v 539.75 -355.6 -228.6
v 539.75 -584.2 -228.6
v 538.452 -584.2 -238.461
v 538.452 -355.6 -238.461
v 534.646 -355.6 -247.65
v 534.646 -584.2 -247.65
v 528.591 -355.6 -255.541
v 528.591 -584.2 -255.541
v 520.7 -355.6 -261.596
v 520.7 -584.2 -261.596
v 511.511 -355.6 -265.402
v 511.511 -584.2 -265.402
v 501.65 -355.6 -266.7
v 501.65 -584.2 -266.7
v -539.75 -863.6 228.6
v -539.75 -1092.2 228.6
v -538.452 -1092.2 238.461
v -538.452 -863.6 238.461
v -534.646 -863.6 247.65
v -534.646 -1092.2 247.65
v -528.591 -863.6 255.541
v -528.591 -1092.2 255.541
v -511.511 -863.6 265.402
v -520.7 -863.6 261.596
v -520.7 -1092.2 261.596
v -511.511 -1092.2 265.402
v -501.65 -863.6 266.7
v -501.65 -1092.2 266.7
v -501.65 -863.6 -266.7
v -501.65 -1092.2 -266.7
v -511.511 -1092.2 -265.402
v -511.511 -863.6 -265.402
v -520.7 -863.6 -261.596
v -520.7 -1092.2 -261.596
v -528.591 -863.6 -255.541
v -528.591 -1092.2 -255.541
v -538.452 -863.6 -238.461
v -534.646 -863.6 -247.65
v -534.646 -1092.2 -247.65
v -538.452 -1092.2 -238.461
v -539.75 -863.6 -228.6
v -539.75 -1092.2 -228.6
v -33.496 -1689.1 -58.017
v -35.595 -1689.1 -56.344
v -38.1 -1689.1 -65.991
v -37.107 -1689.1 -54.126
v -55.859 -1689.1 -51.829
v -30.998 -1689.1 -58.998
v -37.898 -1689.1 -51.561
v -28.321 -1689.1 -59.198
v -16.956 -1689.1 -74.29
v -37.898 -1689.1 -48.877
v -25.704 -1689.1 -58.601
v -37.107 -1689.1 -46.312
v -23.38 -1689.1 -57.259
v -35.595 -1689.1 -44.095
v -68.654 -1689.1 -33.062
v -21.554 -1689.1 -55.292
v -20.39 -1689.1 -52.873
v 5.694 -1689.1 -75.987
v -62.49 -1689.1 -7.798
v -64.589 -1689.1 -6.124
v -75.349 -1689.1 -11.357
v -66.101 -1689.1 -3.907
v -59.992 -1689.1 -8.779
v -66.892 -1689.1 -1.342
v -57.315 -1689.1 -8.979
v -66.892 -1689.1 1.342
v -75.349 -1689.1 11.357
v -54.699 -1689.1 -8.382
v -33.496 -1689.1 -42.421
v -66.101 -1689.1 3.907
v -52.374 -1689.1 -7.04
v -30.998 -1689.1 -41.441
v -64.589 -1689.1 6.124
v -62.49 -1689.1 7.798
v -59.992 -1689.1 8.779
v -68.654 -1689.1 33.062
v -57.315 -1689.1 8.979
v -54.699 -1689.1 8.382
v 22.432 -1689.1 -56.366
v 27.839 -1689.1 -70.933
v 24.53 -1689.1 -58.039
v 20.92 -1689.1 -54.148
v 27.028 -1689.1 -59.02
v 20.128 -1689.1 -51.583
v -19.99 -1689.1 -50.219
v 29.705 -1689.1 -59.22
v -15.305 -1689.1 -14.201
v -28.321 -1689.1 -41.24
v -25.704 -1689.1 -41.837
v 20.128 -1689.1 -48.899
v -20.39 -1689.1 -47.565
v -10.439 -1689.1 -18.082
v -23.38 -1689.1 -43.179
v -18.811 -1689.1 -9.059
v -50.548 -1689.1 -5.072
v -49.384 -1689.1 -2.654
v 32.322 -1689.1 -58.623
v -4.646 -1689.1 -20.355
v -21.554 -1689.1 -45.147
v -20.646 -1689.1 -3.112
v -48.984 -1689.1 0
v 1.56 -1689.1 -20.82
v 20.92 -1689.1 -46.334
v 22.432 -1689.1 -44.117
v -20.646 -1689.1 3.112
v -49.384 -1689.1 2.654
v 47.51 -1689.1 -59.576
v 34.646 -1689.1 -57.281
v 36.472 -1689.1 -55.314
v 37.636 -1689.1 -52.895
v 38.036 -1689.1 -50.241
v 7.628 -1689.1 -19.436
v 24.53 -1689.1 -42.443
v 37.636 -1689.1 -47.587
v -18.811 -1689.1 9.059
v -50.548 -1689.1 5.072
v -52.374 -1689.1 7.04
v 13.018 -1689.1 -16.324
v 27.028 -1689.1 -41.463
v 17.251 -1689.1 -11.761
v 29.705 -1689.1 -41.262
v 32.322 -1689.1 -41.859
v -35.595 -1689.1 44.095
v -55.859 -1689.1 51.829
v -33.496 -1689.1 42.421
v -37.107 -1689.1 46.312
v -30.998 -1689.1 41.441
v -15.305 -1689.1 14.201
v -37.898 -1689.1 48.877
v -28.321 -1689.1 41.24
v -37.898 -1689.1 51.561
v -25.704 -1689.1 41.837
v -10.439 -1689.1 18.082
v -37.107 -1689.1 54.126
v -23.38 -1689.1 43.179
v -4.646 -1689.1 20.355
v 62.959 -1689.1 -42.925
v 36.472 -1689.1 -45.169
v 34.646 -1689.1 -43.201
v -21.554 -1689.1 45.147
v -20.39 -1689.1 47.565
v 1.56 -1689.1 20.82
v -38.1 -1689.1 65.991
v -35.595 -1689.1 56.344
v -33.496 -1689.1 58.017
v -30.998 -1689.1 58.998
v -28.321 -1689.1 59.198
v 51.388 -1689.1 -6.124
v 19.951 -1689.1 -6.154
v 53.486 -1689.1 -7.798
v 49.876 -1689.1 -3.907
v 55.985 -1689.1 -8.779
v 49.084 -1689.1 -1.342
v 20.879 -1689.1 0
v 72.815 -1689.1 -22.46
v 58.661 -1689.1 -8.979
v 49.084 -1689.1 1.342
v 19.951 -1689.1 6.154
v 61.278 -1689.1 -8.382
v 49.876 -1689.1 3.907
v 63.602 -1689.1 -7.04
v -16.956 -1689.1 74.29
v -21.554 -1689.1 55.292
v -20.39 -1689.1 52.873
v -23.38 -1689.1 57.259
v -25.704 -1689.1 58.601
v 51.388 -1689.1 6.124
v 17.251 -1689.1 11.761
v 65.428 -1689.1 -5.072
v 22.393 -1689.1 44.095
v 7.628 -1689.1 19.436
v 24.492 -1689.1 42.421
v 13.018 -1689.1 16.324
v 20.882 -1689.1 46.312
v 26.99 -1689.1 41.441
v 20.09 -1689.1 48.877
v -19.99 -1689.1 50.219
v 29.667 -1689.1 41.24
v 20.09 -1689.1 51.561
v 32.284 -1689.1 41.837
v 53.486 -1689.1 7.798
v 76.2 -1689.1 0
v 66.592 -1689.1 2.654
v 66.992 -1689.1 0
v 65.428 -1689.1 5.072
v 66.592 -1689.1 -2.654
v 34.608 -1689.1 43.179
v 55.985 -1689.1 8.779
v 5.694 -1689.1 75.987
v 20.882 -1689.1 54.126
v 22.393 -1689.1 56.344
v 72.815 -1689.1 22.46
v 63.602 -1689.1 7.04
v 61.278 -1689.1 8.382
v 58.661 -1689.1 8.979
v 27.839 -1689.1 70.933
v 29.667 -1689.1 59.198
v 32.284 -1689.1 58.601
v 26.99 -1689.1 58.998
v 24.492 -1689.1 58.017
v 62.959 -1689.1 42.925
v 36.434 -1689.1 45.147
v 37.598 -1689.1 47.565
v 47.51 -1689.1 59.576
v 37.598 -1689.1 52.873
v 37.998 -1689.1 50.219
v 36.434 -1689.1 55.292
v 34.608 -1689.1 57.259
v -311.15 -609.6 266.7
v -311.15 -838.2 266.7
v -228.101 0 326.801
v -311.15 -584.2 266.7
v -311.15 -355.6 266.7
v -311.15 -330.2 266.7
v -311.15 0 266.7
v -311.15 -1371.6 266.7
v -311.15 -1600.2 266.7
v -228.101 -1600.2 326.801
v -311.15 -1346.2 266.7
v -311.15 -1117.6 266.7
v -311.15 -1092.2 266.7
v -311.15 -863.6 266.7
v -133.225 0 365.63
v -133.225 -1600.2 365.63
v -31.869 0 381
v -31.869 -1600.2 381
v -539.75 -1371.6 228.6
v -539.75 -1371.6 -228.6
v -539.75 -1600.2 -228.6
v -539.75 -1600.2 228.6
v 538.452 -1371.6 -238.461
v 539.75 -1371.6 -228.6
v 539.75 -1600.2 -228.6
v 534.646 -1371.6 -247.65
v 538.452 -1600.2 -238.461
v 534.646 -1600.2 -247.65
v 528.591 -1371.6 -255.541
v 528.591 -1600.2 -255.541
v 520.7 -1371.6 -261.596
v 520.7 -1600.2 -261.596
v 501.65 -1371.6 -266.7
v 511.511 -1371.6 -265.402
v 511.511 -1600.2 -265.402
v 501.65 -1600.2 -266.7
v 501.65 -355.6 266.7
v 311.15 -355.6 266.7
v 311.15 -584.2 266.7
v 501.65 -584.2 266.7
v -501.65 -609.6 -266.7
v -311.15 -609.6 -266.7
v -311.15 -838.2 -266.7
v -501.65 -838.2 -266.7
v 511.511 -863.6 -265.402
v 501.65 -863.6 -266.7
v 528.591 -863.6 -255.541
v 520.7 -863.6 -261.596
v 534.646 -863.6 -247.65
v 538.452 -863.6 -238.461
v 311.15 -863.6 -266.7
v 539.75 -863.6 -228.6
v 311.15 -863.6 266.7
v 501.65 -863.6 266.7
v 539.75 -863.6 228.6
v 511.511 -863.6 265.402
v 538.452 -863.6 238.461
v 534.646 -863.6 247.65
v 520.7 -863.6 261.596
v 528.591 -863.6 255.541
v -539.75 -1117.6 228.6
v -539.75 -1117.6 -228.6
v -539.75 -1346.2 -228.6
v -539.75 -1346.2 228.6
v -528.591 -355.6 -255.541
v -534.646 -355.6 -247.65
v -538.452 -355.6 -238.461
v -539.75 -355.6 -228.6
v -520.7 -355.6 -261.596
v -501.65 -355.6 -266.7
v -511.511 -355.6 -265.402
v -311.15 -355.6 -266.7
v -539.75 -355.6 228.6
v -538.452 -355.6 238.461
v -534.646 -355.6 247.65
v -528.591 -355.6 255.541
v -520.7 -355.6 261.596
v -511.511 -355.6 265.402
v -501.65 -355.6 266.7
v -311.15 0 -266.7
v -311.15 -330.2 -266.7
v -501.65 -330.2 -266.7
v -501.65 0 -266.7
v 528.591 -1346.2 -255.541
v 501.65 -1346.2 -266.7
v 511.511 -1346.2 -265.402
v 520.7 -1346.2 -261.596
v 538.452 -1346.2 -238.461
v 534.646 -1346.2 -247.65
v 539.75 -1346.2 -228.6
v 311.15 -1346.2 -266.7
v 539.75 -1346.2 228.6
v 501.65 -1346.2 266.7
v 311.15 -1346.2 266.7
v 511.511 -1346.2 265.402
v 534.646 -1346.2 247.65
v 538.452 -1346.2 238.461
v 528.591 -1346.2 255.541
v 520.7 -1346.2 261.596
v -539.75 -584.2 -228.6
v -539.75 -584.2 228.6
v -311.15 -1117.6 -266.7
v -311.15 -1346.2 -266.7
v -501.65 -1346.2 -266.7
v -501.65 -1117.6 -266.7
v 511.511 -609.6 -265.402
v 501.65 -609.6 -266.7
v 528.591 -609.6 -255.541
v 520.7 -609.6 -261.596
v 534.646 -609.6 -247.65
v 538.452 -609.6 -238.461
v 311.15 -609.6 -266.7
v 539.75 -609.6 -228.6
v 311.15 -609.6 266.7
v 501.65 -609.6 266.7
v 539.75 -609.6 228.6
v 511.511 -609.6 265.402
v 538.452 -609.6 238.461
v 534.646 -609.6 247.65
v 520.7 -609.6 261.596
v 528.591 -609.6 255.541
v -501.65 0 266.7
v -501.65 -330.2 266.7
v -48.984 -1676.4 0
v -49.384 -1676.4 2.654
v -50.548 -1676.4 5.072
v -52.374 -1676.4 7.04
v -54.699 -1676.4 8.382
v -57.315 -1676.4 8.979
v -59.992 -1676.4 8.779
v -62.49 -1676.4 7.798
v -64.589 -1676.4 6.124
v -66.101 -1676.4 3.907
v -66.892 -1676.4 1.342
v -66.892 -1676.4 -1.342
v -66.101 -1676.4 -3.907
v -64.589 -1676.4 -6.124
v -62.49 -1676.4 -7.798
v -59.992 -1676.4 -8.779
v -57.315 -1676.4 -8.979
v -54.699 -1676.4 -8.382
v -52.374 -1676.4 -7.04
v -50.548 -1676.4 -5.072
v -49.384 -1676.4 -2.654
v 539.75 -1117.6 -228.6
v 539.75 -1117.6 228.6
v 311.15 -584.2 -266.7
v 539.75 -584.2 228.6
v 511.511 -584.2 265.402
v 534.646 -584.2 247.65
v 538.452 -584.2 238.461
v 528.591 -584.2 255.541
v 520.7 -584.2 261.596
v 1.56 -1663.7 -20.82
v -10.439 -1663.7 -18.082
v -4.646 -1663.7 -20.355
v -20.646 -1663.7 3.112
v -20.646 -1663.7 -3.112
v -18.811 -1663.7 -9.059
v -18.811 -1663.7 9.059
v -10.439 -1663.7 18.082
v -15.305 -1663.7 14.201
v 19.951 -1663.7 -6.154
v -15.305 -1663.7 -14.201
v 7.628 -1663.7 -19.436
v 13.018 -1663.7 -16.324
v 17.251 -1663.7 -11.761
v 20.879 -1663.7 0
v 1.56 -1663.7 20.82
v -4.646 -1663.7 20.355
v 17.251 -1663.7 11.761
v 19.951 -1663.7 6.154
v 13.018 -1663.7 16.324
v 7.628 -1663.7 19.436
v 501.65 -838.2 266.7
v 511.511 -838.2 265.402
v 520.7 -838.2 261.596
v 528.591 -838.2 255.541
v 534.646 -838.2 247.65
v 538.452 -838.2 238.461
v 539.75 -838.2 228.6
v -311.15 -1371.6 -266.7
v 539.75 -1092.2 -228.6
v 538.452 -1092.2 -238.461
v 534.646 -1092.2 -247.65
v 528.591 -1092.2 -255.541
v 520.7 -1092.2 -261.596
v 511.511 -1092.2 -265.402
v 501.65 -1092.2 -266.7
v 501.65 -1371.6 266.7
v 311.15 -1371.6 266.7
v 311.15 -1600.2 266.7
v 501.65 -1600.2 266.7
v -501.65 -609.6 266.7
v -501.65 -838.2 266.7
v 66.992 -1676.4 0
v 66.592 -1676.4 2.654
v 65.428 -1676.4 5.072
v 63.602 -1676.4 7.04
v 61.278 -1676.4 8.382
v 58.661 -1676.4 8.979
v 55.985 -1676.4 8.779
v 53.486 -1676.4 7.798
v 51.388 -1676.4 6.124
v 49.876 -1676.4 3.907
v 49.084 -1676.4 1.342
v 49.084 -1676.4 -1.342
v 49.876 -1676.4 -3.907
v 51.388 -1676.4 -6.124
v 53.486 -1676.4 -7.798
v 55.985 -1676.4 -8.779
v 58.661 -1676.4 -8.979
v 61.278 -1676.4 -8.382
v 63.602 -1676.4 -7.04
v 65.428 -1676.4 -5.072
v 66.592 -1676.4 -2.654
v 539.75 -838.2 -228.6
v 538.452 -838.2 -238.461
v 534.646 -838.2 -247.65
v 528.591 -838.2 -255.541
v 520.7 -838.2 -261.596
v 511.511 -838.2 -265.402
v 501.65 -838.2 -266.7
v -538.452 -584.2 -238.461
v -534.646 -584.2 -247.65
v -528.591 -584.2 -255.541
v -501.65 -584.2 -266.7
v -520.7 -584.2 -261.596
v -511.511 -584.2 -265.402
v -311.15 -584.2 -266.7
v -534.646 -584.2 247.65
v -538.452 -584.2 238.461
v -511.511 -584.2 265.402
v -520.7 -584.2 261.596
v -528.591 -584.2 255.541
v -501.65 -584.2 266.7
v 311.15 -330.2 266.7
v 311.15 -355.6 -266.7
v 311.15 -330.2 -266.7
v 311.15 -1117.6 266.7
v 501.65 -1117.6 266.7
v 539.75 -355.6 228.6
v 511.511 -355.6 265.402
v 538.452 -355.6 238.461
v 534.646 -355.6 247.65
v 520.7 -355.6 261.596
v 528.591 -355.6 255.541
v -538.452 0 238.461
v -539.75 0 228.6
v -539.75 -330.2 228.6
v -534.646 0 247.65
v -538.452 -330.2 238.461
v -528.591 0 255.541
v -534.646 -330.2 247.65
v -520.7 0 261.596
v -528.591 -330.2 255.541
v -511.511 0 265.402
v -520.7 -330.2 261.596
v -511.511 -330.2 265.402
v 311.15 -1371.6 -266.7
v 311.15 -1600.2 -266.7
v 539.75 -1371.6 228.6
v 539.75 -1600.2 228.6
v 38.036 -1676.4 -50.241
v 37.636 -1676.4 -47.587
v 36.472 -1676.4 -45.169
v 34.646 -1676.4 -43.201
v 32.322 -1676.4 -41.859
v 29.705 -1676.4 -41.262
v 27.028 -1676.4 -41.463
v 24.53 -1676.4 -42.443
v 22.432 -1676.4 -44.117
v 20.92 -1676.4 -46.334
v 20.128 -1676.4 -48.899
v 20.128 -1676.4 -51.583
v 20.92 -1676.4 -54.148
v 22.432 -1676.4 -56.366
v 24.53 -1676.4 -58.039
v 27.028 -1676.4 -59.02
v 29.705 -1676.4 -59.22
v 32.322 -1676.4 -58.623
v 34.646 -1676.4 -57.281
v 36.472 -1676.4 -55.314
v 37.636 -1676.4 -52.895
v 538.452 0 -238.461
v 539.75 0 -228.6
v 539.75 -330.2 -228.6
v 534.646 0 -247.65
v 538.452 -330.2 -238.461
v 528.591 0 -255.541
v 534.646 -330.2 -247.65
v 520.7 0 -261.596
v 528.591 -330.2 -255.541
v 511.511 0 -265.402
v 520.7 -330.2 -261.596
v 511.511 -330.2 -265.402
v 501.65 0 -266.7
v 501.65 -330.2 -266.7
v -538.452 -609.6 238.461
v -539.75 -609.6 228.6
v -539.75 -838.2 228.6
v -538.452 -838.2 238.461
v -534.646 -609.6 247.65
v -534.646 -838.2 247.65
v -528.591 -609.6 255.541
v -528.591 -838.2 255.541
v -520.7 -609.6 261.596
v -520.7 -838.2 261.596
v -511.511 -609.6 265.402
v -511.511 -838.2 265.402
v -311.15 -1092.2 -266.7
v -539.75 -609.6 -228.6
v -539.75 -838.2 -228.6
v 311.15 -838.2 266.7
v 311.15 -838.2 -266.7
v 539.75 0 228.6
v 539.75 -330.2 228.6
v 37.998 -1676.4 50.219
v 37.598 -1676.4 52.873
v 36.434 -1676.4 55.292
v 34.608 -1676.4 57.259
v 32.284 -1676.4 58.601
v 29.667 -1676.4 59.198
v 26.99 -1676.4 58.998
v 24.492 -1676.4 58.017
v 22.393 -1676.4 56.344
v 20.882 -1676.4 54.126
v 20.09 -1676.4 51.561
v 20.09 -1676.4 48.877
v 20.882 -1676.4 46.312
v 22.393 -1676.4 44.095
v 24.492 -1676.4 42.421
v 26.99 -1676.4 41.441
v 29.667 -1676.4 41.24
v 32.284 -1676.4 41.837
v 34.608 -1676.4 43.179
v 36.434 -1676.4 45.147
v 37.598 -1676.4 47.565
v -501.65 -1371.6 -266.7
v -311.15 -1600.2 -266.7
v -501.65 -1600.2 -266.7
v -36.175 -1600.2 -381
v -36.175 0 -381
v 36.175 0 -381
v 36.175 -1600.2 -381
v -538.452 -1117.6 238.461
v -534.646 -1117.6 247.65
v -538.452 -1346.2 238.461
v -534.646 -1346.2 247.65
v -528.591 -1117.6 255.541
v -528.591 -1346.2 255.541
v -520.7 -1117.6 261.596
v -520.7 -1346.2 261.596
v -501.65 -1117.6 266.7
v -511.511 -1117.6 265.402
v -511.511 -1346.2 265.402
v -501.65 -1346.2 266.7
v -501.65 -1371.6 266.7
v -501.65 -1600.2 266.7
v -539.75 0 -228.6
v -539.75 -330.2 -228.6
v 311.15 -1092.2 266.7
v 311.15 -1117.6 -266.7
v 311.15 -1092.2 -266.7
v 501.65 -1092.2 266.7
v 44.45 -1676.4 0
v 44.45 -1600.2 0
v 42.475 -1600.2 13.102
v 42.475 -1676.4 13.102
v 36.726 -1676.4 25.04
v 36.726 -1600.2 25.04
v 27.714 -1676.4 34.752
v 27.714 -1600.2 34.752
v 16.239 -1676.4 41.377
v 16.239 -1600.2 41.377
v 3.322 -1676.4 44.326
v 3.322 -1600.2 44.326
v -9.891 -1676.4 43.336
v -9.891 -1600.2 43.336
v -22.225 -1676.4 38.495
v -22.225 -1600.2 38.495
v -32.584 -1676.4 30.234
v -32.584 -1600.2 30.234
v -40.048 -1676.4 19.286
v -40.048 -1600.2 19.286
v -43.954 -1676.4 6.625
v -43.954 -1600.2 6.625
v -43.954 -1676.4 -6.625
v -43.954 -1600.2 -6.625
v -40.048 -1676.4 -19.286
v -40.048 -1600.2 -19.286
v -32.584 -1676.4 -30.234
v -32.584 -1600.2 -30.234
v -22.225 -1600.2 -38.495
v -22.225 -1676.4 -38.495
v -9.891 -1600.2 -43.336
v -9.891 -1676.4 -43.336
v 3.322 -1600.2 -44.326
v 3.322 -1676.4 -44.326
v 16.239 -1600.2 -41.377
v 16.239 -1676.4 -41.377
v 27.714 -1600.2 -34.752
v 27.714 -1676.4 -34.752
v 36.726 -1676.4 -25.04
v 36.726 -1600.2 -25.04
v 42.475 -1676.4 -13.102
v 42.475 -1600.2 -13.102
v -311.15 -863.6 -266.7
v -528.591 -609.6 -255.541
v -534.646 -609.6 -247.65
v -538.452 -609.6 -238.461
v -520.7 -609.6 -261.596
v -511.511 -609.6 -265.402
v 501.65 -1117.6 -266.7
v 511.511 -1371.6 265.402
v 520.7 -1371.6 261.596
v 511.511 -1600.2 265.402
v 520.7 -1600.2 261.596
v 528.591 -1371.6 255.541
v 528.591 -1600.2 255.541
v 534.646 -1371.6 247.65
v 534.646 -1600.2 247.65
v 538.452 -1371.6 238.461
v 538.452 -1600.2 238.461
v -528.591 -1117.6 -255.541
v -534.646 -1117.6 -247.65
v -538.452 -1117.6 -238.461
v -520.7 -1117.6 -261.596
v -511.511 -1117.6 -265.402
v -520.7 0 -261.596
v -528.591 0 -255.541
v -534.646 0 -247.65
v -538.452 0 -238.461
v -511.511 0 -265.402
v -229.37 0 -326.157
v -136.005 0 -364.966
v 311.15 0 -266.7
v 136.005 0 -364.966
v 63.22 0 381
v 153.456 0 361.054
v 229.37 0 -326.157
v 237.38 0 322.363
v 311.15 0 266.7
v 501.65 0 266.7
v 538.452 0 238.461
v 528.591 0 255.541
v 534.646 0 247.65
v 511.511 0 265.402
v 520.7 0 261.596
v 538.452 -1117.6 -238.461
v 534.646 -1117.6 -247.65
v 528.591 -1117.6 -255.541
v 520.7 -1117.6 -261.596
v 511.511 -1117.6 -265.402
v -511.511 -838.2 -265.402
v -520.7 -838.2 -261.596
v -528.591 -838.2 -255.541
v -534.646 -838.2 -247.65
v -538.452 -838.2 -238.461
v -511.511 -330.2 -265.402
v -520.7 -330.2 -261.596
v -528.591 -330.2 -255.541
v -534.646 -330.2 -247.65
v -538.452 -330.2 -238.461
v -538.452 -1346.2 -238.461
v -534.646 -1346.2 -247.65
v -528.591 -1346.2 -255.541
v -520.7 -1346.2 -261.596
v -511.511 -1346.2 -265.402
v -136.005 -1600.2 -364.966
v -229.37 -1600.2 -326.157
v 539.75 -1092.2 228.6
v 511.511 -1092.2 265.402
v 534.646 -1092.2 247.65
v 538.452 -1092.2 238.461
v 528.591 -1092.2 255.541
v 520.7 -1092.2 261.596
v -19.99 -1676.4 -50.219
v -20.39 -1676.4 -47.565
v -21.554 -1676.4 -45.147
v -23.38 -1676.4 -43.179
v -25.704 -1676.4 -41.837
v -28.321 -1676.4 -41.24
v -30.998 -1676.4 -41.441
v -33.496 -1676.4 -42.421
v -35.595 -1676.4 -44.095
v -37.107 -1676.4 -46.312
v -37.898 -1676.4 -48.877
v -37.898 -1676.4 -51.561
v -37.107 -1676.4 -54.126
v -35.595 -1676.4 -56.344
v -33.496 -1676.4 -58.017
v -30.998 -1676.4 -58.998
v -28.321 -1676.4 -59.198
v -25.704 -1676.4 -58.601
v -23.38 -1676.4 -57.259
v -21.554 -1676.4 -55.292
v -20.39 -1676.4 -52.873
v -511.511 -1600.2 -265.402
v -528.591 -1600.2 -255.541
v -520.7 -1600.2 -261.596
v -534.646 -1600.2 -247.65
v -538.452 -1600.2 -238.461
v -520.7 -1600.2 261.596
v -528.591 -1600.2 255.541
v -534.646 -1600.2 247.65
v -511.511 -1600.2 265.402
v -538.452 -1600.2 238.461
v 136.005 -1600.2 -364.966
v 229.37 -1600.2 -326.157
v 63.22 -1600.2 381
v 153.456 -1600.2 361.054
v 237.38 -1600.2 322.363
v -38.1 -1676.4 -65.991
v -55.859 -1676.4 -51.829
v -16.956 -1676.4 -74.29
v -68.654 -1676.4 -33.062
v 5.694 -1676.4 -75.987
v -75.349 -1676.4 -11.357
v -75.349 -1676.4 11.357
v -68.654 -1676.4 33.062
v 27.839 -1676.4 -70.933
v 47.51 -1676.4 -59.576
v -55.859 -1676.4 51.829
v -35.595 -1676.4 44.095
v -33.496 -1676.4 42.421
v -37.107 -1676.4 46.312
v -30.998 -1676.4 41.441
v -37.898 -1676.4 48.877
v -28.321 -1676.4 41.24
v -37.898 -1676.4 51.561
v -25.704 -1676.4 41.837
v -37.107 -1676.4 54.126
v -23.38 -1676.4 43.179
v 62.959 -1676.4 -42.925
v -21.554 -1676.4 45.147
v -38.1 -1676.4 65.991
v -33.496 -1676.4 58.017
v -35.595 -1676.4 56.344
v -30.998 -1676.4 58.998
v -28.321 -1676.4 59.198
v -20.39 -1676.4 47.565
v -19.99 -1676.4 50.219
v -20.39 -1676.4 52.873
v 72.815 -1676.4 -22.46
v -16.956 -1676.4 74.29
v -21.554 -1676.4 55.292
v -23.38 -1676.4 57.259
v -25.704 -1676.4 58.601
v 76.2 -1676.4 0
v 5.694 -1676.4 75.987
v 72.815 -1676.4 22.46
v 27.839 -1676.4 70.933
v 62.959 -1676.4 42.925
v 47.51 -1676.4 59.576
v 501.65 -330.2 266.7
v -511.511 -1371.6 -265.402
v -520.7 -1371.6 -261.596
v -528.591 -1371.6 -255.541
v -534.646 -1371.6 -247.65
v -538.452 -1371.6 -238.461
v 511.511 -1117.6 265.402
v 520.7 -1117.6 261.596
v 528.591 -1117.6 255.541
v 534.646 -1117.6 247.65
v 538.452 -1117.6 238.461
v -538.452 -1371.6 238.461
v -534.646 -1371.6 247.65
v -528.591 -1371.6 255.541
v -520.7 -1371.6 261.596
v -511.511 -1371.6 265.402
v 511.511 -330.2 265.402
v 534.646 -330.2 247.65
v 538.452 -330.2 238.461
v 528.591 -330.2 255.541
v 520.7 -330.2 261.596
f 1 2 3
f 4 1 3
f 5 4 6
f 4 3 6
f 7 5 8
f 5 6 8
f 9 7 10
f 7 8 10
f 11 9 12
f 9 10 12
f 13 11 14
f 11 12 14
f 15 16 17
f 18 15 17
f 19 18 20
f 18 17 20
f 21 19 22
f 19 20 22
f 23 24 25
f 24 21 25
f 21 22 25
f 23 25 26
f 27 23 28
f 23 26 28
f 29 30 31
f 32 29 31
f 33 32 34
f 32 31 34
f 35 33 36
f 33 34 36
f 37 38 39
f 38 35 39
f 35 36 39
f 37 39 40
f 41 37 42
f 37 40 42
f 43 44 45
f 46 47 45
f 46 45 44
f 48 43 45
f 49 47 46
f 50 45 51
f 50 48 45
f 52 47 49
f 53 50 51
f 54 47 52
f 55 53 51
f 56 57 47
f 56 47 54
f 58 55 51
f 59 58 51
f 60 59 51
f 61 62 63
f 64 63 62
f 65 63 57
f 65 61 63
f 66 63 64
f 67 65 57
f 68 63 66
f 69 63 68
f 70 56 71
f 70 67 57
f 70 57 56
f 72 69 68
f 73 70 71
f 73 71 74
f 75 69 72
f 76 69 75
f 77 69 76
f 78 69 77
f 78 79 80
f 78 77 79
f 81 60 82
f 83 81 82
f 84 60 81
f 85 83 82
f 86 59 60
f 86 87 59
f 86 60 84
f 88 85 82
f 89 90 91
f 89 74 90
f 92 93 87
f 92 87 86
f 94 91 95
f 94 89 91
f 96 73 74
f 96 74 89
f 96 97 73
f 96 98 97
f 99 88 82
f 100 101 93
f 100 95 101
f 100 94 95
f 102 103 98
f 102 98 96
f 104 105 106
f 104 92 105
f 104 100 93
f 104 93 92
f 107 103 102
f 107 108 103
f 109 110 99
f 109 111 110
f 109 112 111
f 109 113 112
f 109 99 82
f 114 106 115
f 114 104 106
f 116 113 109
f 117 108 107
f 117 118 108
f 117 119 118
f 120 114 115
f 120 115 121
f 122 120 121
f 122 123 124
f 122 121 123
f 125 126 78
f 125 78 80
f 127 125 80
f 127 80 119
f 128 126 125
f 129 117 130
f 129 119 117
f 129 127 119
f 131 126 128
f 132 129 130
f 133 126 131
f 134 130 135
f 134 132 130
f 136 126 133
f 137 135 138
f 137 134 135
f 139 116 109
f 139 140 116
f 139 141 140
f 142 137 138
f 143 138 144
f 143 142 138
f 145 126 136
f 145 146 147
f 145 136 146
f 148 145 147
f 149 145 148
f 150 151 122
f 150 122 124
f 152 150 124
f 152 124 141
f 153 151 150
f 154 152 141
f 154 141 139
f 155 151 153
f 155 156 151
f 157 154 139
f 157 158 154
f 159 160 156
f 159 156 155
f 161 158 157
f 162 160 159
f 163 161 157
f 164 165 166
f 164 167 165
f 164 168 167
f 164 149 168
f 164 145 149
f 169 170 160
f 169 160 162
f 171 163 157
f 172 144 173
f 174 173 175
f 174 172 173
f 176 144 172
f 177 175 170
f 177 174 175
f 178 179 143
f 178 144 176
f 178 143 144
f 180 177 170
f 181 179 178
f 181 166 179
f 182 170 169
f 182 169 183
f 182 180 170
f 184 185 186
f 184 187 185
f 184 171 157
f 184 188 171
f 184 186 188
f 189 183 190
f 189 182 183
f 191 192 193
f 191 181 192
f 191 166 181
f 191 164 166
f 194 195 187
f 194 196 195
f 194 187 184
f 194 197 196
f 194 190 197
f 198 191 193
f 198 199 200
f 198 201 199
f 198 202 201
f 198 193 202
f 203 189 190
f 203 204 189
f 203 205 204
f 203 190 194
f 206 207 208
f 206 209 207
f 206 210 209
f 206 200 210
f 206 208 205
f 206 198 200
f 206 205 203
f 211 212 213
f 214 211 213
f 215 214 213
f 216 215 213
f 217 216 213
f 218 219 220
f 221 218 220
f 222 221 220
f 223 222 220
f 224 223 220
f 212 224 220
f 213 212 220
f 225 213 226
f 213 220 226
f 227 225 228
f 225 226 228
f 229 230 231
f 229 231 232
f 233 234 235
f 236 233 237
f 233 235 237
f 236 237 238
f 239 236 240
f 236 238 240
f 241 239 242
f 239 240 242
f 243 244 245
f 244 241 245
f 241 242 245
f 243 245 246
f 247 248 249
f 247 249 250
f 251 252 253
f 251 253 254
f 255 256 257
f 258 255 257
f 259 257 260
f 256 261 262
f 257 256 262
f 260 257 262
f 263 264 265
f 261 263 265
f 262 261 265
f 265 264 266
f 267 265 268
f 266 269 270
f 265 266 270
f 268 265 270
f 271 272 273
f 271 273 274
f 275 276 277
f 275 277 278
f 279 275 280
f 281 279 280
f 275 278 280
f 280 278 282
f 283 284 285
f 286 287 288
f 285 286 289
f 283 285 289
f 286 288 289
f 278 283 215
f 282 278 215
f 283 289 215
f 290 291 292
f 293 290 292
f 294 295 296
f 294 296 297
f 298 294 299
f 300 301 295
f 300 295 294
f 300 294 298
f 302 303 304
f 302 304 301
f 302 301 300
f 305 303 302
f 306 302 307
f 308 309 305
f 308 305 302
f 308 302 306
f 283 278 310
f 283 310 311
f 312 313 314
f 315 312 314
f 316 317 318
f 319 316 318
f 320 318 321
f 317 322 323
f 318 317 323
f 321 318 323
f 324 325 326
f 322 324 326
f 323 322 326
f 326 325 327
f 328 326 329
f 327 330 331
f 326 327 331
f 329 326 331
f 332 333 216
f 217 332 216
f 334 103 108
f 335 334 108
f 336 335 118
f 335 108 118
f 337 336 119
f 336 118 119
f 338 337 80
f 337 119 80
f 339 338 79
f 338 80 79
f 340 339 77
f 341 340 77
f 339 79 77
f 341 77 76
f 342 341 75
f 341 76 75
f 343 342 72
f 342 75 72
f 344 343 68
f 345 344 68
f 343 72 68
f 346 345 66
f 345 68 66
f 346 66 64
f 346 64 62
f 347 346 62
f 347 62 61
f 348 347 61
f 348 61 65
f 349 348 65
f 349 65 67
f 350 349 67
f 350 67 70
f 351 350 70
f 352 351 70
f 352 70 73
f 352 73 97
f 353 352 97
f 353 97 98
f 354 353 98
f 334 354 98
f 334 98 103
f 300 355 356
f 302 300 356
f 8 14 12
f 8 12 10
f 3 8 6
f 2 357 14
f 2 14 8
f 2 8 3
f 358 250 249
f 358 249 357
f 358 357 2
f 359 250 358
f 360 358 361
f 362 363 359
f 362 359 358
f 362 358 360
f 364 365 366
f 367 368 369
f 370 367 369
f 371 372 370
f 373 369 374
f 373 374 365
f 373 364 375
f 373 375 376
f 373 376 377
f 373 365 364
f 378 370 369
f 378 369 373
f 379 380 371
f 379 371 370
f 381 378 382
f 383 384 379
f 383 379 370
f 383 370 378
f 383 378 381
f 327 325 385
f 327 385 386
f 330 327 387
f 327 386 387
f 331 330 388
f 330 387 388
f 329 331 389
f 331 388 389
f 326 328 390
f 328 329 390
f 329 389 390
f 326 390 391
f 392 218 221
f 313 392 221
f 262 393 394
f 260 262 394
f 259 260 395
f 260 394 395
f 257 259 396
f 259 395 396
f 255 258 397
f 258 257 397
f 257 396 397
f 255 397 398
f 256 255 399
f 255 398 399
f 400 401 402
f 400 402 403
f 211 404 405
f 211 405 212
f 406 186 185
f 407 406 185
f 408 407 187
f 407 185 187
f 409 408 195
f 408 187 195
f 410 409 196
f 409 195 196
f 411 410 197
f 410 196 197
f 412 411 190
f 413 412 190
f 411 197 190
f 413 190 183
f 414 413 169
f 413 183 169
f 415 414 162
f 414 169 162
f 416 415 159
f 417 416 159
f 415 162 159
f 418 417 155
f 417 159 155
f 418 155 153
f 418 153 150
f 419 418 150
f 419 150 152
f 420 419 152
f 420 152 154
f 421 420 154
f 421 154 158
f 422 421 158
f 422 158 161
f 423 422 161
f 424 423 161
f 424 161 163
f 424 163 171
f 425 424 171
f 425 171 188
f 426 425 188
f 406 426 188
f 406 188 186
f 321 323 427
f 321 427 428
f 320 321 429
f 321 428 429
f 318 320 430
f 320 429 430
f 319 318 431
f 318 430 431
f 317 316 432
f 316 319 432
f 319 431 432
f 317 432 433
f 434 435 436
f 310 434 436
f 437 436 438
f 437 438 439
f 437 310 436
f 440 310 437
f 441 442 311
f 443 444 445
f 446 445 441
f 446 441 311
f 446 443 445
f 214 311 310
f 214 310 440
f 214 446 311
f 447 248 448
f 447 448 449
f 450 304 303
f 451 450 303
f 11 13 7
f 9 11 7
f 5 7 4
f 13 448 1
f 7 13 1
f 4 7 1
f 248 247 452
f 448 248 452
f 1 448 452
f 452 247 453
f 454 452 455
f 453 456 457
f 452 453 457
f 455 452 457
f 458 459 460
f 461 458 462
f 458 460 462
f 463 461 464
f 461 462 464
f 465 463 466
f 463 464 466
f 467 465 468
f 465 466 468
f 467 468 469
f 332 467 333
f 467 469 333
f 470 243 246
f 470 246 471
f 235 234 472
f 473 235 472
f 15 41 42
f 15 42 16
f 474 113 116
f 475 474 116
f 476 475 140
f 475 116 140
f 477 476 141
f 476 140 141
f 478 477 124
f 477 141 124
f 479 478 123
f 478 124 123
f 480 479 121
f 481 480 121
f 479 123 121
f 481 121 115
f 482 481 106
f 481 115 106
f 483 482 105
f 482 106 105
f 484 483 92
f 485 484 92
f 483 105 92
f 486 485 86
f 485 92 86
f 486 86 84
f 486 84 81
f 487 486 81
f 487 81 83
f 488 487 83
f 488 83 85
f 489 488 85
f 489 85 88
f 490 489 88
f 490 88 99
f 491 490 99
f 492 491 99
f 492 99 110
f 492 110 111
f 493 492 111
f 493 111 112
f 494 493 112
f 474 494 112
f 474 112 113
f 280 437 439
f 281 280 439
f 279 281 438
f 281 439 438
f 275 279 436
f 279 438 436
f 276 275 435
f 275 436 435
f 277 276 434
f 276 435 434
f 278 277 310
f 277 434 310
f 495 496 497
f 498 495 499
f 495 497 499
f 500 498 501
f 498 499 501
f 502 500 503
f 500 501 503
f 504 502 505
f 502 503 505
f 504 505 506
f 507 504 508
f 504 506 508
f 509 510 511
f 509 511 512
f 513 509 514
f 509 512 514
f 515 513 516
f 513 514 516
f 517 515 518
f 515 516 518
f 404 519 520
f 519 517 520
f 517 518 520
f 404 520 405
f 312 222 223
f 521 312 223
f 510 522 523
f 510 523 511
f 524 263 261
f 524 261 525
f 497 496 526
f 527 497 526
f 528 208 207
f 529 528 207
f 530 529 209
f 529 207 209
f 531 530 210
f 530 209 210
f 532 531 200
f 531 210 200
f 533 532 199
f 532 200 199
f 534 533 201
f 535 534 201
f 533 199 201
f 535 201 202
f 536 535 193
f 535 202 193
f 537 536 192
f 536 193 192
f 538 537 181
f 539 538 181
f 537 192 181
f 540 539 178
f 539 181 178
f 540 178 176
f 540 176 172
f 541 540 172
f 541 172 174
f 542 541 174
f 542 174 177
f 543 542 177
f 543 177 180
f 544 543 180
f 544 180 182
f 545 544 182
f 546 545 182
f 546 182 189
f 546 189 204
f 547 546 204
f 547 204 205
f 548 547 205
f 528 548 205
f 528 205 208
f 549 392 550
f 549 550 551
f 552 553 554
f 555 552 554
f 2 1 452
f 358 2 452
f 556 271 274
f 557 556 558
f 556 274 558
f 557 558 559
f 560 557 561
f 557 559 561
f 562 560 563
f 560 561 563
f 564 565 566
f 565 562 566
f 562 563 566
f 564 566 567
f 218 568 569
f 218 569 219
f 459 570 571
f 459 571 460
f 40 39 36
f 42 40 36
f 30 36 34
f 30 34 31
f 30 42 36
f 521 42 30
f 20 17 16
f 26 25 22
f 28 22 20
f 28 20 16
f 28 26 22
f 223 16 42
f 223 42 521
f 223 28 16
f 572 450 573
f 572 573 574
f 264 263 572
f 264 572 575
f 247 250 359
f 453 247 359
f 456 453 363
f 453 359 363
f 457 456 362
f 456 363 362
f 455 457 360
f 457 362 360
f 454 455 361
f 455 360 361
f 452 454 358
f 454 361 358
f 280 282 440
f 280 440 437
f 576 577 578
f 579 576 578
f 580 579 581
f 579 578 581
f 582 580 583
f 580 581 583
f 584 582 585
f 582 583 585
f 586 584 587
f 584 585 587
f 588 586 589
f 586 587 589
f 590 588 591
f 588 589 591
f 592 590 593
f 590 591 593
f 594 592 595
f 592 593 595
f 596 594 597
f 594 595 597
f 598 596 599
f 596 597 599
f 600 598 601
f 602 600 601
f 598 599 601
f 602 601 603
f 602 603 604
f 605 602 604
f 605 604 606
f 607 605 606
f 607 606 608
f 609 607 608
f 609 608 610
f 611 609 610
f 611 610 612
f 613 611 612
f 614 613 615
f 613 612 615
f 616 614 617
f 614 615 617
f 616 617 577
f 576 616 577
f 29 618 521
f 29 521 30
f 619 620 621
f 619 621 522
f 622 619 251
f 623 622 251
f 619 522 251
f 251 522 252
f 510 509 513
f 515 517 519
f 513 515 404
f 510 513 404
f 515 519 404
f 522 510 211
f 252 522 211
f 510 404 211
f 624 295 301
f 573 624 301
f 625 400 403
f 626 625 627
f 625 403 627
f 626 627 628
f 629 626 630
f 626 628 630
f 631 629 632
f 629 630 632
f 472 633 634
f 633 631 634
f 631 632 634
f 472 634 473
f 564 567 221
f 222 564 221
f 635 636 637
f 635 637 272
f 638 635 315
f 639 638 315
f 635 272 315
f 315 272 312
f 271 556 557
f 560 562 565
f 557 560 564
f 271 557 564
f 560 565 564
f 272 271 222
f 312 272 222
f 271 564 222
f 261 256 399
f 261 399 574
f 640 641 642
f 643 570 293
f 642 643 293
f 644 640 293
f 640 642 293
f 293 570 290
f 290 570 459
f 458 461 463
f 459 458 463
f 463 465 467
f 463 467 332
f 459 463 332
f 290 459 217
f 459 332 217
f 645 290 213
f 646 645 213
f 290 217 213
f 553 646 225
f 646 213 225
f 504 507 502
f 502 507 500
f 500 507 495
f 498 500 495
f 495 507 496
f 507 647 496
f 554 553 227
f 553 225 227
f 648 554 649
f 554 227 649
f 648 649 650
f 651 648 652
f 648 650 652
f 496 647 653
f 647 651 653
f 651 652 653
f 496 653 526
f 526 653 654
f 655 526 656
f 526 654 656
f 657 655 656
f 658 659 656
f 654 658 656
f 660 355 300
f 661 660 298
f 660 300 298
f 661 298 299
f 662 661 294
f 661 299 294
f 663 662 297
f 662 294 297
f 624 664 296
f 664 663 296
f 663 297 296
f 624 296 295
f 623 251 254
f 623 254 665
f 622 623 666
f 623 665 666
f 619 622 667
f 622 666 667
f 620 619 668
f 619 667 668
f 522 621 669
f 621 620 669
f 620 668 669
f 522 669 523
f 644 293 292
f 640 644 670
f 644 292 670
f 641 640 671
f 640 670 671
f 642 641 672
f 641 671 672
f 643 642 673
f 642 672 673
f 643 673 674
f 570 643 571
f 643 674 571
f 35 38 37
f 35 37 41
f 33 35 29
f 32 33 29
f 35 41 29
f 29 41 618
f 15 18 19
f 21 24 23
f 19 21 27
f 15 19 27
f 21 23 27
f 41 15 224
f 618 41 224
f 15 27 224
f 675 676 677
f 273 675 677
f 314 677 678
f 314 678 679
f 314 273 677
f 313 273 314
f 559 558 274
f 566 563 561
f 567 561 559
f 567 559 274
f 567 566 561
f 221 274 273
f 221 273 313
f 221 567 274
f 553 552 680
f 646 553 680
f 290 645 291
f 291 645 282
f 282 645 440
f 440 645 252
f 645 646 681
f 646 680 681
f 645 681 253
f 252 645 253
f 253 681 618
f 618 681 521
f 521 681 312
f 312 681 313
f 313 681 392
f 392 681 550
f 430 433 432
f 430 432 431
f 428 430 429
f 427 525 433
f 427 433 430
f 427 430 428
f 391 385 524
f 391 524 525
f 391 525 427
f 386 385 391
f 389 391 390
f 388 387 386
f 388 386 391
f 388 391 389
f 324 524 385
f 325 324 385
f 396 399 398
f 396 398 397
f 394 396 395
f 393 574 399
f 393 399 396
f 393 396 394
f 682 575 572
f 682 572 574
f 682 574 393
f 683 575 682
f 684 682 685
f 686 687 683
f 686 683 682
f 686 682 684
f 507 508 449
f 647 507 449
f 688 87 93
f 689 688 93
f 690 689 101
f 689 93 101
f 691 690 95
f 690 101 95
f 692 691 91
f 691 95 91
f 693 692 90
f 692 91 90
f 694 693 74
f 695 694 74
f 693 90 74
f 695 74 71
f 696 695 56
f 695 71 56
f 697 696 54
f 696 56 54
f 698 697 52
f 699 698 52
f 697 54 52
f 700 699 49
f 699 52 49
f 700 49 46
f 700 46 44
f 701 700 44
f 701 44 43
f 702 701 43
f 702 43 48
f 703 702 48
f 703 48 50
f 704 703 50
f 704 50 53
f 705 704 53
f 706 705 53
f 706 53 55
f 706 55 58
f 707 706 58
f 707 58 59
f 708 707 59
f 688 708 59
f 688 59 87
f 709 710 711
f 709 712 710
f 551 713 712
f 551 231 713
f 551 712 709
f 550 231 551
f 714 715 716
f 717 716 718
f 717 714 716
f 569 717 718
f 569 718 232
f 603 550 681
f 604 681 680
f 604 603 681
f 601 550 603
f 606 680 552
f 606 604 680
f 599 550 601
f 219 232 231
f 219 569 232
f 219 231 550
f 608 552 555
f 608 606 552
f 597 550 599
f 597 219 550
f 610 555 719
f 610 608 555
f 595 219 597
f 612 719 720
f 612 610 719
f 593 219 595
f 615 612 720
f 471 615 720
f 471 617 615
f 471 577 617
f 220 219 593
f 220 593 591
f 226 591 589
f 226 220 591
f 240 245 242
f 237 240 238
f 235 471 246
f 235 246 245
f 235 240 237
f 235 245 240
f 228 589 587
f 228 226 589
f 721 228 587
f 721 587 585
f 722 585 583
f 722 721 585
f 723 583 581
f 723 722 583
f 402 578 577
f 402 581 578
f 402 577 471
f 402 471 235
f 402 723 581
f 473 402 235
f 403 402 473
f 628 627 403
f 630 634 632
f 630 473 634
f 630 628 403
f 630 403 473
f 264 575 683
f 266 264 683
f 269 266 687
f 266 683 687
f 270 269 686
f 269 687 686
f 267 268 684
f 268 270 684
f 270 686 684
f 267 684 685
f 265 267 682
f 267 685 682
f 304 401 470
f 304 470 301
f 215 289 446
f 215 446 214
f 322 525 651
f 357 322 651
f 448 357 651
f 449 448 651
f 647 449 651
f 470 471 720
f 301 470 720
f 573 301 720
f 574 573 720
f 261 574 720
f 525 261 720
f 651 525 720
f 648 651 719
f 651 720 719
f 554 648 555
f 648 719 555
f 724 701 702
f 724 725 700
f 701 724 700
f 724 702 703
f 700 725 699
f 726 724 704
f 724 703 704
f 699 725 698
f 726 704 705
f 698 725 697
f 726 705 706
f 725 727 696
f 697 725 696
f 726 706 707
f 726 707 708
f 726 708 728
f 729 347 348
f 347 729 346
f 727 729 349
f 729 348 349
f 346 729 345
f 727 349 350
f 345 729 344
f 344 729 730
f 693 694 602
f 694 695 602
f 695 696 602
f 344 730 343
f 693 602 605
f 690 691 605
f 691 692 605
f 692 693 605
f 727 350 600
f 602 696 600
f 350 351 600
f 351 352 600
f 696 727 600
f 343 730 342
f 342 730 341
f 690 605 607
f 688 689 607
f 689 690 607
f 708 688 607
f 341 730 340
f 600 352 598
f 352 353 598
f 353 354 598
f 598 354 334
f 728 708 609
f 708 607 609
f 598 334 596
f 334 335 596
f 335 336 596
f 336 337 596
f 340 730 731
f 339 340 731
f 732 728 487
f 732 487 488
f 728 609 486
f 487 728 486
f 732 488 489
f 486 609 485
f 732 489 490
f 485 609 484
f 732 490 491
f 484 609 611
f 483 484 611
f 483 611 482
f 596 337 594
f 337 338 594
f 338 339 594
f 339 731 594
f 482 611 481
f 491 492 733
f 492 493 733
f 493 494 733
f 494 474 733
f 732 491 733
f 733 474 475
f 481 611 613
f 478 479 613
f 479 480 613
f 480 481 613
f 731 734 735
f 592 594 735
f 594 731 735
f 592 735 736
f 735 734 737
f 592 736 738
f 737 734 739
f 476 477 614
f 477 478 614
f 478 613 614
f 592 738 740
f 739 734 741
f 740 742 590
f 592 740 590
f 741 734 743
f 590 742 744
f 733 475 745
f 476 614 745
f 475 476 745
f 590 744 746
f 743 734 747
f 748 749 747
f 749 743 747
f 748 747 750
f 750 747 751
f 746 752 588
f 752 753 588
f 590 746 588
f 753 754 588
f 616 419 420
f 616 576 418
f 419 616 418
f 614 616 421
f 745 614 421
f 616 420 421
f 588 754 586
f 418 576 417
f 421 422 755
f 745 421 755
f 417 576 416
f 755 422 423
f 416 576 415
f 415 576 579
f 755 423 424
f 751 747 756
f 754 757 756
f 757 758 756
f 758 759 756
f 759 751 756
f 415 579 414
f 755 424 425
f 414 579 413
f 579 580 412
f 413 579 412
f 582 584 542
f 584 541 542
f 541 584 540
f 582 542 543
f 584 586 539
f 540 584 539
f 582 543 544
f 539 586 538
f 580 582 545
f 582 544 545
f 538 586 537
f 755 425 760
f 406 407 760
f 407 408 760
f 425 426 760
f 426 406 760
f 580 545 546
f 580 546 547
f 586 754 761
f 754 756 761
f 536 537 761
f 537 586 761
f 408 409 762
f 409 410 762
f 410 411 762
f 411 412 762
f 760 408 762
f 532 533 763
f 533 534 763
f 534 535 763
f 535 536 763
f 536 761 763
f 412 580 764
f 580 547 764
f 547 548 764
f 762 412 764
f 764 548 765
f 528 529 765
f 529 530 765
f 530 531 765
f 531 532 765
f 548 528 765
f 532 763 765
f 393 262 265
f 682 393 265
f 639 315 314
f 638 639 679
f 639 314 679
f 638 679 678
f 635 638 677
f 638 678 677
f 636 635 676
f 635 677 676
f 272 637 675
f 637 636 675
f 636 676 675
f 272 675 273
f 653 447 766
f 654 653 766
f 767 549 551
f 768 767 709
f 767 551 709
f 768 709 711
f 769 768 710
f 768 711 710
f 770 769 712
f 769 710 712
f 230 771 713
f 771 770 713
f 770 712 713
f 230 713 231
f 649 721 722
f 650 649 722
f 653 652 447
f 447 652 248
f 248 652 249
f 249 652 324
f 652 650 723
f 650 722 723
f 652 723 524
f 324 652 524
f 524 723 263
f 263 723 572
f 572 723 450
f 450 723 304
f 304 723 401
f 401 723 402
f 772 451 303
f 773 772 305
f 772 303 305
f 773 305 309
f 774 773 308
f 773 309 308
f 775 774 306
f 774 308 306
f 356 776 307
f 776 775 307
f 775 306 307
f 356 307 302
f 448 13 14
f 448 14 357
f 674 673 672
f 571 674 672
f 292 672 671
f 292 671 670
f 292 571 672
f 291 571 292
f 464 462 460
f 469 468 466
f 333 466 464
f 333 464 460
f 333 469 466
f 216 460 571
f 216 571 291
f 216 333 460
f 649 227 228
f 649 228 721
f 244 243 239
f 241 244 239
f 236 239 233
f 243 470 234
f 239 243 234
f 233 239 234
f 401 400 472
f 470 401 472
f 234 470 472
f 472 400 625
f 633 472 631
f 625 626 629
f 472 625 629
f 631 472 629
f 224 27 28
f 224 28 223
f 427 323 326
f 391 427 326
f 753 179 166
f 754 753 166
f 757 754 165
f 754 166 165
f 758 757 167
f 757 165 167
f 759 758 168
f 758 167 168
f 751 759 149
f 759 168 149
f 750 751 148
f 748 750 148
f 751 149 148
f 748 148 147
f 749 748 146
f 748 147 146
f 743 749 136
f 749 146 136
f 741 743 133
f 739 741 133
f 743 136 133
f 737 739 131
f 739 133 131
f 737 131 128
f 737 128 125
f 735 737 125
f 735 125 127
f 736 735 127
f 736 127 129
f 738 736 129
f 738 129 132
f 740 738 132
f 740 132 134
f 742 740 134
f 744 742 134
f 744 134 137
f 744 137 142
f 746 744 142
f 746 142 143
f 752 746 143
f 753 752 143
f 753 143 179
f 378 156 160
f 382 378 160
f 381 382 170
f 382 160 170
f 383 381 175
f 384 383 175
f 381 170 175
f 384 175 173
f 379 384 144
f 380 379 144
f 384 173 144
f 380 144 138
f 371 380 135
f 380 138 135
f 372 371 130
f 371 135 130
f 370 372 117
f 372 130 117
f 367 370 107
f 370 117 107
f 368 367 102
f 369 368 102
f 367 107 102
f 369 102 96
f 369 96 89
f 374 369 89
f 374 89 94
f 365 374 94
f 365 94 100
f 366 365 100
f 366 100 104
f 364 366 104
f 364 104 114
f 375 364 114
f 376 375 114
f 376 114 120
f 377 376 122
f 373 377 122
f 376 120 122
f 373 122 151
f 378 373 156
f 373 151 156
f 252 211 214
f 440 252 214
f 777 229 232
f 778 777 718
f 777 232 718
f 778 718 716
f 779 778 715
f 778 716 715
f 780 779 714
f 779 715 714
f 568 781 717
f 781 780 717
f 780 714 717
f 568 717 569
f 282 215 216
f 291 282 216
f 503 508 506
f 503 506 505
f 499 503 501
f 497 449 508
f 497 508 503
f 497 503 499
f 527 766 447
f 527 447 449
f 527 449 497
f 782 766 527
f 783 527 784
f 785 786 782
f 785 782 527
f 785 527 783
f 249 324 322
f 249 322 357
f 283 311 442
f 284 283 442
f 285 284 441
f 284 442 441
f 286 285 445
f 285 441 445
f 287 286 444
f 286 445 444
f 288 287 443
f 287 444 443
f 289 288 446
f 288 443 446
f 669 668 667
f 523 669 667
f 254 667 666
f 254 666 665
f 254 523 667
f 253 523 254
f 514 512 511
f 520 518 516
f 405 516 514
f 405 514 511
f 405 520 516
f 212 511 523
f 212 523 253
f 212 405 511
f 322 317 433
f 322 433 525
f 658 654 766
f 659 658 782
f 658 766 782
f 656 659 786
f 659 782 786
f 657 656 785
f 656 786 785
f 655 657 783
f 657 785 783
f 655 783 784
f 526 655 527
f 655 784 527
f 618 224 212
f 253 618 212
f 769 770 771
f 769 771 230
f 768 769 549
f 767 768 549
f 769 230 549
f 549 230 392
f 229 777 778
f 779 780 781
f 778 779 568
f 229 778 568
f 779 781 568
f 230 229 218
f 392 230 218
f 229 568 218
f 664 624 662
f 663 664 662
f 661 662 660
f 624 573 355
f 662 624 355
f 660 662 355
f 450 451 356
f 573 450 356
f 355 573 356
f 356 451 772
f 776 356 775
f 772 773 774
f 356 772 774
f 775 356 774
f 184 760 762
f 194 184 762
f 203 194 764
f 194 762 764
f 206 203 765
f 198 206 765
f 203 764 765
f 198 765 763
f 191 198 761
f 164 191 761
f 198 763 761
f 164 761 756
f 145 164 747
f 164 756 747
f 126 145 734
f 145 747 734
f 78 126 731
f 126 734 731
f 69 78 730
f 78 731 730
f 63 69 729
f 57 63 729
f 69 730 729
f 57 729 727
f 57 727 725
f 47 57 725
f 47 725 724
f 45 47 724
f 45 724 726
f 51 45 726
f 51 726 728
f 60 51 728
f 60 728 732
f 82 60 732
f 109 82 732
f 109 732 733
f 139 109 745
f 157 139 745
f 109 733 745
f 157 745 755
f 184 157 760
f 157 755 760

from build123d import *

# Parameters (mm, degrees)
F0_W      = 1079.5
F0_H      = 762
F1_DEPTH  = 1600.2
F3_DEPTH  = 2032
F4_W      = 228.6
F4_H      = 25.4
F5_DEPTH  = 889
F6_W      = 228.6
F6_H      = 25.4
F7_DEPTH  = 762
F9_DEPTH  = 2032
F10_R     = 44.45
F11_DEPTH = 76.2
F12_R     = 76.2
F12_R_2   = 44.45
F13_DEPTH = 12.7
F14_R     = 9.0043
F14_R_2   = 20.8788
F15_DEPTH = 25.4


with BuildPart() as f1:
    # F0 (on Front) → F1 (new body)
    with BuildSketch(Plane.XZ):
        Rectangle(F0_W, F0_H)
    extrude(amount=F1_DEPTH)

    # F2 (on face) → F3 (cut)
    with BuildSketch(Plane.XZ.offset(1600.2)):
        with BuildLine():
            Line((-539.75, 381), (-539.75, 266.7))
            Line((-539.75, 266.7), (-311.15, 266.7))
            ThreePointArc((-311.15, 266.7), (-181.819542348, 349.0410030714), (-31.8694487214, 381))
            Line((-31.8694487214, 381), (-539.75, 381))
        make_face()
        with BuildLine():
            Line((539.75, 381), (63.2200438553, 381))
            ThreePointArc((63.2200438553, 381), (196.4561263356, 343.9601006936), (311.15, 266.7))
            Line((311.15, 266.7), (539.75, 266.7))
            Line((539.75, 266.7), (539.75, 381))
        make_face()
        with BuildLine():
            ThreePointArc((311.15, -266.7), (183.8275613975, -348.3038933111), (36.1753911372, -381))
            Line((36.1753911372, -381), (539.75, -381))
            Line((539.75, -381), (539.75, -266.7))
            Line((539.75, -266.7), (311.15, -266.7))
        make_face()
        with BuildLine():
            Line((-311.15, -266.7), (-539.75, -266.7))
            Line((-539.75, -266.7), (-539.75, -381))
            Line((-539.75, -381), (-36.1753911372, -381))
            ThreePointArc((-36.1753911372, -381), (-183.8275613975, -348.3038933111), (-311.15, -266.7))
        make_face()
    extrude(amount=-F3_DEPTH, mode=Mode.SUBTRACT)

    # F4 (on face) → F5 (cut)
    with BuildSketch(Plane.XY.offset(266.7)):
        with Locations((-425.45, -1358.9)):
            Rectangle(F4_W, F4_H)
        with Locations((-425.45, -1104.9)):
            Rectangle(F4_W, F4_H)
        with Locations((-425.45, -850.9)):
            Rectangle(F4_W, F4_H)
        with Locations((-425.45, -596.9)):
            Rectangle(F4_W, F4_H)
        with Locations((-425.45, -342.9)):
            Rectangle(F4_W, F4_H)
    extrude(amount=-F5_DEPTH, mode=Mode.SUBTRACT)

    # F6 (on face) → F7 (cut)
    with BuildSketch(Plane.XY.offset(266.7)):
        with Locations((425.45, -1358.9)):
            Rectangle(F6_W, F6_H)
        with Locations((425.45, -1104.9)):
            Rectangle(F6_W, F6_H)
        with Locations((425.45, -850.9)):
            Rectangle(F6_W, F6_H)
        with Locations((425.45, -596.9)):
            Rectangle(F6_W, F6_H)
        with Locations((425.45, -342.9)):
            Rectangle(F6_W, F6_H)
    extrude(amount=-F7_DEPTH, mode=Mode.SUBTRACT)

    # F8 (on face) → F9 (cut)
    with BuildSketch(Plane.XZ.offset(1600.2)):
        with BuildLine():
            ThreePointArc((-539.75, 228.6), (-528.5907683632, 255.5407683632), (-501.65, 266.7))
            Line((-501.65, 266.7), (-539.75, 266.7))
            Line((-539.75, 266.7), (-539.75, 228.6))
        make_face()
        with BuildLine():
            ThreePointArc((-501.65, -266.7), (-528.5907683632, -255.5407683632), (-539.75, -228.6))
            Line((-539.75, -228.6), (-539.75, -266.7))
            Line((-539.75, -266.7), (-501.65, -266.7))
        make_face()
        with BuildLine():
            Line((539.75, -266.7), (539.75, -228.6))
            ThreePointArc((539.75, -228.6), (528.5907683632, -255.5407683632), (501.65, -266.7))
            Line((501.65, -266.7), (539.75, -266.7))
        make_face()
        with BuildLine():
            Line((539.75, 266.7), (501.65, 266.7))
            ThreePointArc((501.65, 266.7), (528.5907683632, 255.5407683632), (539.75, 228.6))
            Line((539.75, 228.6), (539.75, 266.7))
        make_face()
    extrude(amount=-F9_DEPTH, mode=Mode.SUBTRACT)

    # F10 (on face) → F11 (join)
    with BuildSketch(Plane.XZ.offset(1600.2)):
        Circle(F10_R)
    extrude(amount=F11_DEPTH)

    # F12 (on face) → F13 (join)
    with BuildSketch(Plane.XZ.offset(1676.4)):
        Circle(F12_R)
        Circle(F12_R_2, mode=Mode.SUBTRACT)
        Circle(F12_R_2)
    extrude(amount=F13_DEPTH)

    # F14 (on face) → F15 (cut)
    with BuildSketch(Plane.XZ.offset(1689.1)):
        with Locations((-28.9941, 50.2192543197)):
            Circle(F14_R)
        with Locations((-57.9882, 0)):
            Circle(F14_R)
        with Locations((-28.9941, -50.2192543197)):
            Circle(F14_R)
        with Locations((29.0321442983, -50.2412)):
            Circle(F14_R)
        with Locations((57.9882, 0)):
            Circle(F14_R)
        with Locations((28.9941, 50.2192543197)):
            Circle(F14_R)
        Circle(F14_R_2)
    extrude(amount=-F15_DEPTH, mode=Mode.SUBTRACT)


solid = f1.part
